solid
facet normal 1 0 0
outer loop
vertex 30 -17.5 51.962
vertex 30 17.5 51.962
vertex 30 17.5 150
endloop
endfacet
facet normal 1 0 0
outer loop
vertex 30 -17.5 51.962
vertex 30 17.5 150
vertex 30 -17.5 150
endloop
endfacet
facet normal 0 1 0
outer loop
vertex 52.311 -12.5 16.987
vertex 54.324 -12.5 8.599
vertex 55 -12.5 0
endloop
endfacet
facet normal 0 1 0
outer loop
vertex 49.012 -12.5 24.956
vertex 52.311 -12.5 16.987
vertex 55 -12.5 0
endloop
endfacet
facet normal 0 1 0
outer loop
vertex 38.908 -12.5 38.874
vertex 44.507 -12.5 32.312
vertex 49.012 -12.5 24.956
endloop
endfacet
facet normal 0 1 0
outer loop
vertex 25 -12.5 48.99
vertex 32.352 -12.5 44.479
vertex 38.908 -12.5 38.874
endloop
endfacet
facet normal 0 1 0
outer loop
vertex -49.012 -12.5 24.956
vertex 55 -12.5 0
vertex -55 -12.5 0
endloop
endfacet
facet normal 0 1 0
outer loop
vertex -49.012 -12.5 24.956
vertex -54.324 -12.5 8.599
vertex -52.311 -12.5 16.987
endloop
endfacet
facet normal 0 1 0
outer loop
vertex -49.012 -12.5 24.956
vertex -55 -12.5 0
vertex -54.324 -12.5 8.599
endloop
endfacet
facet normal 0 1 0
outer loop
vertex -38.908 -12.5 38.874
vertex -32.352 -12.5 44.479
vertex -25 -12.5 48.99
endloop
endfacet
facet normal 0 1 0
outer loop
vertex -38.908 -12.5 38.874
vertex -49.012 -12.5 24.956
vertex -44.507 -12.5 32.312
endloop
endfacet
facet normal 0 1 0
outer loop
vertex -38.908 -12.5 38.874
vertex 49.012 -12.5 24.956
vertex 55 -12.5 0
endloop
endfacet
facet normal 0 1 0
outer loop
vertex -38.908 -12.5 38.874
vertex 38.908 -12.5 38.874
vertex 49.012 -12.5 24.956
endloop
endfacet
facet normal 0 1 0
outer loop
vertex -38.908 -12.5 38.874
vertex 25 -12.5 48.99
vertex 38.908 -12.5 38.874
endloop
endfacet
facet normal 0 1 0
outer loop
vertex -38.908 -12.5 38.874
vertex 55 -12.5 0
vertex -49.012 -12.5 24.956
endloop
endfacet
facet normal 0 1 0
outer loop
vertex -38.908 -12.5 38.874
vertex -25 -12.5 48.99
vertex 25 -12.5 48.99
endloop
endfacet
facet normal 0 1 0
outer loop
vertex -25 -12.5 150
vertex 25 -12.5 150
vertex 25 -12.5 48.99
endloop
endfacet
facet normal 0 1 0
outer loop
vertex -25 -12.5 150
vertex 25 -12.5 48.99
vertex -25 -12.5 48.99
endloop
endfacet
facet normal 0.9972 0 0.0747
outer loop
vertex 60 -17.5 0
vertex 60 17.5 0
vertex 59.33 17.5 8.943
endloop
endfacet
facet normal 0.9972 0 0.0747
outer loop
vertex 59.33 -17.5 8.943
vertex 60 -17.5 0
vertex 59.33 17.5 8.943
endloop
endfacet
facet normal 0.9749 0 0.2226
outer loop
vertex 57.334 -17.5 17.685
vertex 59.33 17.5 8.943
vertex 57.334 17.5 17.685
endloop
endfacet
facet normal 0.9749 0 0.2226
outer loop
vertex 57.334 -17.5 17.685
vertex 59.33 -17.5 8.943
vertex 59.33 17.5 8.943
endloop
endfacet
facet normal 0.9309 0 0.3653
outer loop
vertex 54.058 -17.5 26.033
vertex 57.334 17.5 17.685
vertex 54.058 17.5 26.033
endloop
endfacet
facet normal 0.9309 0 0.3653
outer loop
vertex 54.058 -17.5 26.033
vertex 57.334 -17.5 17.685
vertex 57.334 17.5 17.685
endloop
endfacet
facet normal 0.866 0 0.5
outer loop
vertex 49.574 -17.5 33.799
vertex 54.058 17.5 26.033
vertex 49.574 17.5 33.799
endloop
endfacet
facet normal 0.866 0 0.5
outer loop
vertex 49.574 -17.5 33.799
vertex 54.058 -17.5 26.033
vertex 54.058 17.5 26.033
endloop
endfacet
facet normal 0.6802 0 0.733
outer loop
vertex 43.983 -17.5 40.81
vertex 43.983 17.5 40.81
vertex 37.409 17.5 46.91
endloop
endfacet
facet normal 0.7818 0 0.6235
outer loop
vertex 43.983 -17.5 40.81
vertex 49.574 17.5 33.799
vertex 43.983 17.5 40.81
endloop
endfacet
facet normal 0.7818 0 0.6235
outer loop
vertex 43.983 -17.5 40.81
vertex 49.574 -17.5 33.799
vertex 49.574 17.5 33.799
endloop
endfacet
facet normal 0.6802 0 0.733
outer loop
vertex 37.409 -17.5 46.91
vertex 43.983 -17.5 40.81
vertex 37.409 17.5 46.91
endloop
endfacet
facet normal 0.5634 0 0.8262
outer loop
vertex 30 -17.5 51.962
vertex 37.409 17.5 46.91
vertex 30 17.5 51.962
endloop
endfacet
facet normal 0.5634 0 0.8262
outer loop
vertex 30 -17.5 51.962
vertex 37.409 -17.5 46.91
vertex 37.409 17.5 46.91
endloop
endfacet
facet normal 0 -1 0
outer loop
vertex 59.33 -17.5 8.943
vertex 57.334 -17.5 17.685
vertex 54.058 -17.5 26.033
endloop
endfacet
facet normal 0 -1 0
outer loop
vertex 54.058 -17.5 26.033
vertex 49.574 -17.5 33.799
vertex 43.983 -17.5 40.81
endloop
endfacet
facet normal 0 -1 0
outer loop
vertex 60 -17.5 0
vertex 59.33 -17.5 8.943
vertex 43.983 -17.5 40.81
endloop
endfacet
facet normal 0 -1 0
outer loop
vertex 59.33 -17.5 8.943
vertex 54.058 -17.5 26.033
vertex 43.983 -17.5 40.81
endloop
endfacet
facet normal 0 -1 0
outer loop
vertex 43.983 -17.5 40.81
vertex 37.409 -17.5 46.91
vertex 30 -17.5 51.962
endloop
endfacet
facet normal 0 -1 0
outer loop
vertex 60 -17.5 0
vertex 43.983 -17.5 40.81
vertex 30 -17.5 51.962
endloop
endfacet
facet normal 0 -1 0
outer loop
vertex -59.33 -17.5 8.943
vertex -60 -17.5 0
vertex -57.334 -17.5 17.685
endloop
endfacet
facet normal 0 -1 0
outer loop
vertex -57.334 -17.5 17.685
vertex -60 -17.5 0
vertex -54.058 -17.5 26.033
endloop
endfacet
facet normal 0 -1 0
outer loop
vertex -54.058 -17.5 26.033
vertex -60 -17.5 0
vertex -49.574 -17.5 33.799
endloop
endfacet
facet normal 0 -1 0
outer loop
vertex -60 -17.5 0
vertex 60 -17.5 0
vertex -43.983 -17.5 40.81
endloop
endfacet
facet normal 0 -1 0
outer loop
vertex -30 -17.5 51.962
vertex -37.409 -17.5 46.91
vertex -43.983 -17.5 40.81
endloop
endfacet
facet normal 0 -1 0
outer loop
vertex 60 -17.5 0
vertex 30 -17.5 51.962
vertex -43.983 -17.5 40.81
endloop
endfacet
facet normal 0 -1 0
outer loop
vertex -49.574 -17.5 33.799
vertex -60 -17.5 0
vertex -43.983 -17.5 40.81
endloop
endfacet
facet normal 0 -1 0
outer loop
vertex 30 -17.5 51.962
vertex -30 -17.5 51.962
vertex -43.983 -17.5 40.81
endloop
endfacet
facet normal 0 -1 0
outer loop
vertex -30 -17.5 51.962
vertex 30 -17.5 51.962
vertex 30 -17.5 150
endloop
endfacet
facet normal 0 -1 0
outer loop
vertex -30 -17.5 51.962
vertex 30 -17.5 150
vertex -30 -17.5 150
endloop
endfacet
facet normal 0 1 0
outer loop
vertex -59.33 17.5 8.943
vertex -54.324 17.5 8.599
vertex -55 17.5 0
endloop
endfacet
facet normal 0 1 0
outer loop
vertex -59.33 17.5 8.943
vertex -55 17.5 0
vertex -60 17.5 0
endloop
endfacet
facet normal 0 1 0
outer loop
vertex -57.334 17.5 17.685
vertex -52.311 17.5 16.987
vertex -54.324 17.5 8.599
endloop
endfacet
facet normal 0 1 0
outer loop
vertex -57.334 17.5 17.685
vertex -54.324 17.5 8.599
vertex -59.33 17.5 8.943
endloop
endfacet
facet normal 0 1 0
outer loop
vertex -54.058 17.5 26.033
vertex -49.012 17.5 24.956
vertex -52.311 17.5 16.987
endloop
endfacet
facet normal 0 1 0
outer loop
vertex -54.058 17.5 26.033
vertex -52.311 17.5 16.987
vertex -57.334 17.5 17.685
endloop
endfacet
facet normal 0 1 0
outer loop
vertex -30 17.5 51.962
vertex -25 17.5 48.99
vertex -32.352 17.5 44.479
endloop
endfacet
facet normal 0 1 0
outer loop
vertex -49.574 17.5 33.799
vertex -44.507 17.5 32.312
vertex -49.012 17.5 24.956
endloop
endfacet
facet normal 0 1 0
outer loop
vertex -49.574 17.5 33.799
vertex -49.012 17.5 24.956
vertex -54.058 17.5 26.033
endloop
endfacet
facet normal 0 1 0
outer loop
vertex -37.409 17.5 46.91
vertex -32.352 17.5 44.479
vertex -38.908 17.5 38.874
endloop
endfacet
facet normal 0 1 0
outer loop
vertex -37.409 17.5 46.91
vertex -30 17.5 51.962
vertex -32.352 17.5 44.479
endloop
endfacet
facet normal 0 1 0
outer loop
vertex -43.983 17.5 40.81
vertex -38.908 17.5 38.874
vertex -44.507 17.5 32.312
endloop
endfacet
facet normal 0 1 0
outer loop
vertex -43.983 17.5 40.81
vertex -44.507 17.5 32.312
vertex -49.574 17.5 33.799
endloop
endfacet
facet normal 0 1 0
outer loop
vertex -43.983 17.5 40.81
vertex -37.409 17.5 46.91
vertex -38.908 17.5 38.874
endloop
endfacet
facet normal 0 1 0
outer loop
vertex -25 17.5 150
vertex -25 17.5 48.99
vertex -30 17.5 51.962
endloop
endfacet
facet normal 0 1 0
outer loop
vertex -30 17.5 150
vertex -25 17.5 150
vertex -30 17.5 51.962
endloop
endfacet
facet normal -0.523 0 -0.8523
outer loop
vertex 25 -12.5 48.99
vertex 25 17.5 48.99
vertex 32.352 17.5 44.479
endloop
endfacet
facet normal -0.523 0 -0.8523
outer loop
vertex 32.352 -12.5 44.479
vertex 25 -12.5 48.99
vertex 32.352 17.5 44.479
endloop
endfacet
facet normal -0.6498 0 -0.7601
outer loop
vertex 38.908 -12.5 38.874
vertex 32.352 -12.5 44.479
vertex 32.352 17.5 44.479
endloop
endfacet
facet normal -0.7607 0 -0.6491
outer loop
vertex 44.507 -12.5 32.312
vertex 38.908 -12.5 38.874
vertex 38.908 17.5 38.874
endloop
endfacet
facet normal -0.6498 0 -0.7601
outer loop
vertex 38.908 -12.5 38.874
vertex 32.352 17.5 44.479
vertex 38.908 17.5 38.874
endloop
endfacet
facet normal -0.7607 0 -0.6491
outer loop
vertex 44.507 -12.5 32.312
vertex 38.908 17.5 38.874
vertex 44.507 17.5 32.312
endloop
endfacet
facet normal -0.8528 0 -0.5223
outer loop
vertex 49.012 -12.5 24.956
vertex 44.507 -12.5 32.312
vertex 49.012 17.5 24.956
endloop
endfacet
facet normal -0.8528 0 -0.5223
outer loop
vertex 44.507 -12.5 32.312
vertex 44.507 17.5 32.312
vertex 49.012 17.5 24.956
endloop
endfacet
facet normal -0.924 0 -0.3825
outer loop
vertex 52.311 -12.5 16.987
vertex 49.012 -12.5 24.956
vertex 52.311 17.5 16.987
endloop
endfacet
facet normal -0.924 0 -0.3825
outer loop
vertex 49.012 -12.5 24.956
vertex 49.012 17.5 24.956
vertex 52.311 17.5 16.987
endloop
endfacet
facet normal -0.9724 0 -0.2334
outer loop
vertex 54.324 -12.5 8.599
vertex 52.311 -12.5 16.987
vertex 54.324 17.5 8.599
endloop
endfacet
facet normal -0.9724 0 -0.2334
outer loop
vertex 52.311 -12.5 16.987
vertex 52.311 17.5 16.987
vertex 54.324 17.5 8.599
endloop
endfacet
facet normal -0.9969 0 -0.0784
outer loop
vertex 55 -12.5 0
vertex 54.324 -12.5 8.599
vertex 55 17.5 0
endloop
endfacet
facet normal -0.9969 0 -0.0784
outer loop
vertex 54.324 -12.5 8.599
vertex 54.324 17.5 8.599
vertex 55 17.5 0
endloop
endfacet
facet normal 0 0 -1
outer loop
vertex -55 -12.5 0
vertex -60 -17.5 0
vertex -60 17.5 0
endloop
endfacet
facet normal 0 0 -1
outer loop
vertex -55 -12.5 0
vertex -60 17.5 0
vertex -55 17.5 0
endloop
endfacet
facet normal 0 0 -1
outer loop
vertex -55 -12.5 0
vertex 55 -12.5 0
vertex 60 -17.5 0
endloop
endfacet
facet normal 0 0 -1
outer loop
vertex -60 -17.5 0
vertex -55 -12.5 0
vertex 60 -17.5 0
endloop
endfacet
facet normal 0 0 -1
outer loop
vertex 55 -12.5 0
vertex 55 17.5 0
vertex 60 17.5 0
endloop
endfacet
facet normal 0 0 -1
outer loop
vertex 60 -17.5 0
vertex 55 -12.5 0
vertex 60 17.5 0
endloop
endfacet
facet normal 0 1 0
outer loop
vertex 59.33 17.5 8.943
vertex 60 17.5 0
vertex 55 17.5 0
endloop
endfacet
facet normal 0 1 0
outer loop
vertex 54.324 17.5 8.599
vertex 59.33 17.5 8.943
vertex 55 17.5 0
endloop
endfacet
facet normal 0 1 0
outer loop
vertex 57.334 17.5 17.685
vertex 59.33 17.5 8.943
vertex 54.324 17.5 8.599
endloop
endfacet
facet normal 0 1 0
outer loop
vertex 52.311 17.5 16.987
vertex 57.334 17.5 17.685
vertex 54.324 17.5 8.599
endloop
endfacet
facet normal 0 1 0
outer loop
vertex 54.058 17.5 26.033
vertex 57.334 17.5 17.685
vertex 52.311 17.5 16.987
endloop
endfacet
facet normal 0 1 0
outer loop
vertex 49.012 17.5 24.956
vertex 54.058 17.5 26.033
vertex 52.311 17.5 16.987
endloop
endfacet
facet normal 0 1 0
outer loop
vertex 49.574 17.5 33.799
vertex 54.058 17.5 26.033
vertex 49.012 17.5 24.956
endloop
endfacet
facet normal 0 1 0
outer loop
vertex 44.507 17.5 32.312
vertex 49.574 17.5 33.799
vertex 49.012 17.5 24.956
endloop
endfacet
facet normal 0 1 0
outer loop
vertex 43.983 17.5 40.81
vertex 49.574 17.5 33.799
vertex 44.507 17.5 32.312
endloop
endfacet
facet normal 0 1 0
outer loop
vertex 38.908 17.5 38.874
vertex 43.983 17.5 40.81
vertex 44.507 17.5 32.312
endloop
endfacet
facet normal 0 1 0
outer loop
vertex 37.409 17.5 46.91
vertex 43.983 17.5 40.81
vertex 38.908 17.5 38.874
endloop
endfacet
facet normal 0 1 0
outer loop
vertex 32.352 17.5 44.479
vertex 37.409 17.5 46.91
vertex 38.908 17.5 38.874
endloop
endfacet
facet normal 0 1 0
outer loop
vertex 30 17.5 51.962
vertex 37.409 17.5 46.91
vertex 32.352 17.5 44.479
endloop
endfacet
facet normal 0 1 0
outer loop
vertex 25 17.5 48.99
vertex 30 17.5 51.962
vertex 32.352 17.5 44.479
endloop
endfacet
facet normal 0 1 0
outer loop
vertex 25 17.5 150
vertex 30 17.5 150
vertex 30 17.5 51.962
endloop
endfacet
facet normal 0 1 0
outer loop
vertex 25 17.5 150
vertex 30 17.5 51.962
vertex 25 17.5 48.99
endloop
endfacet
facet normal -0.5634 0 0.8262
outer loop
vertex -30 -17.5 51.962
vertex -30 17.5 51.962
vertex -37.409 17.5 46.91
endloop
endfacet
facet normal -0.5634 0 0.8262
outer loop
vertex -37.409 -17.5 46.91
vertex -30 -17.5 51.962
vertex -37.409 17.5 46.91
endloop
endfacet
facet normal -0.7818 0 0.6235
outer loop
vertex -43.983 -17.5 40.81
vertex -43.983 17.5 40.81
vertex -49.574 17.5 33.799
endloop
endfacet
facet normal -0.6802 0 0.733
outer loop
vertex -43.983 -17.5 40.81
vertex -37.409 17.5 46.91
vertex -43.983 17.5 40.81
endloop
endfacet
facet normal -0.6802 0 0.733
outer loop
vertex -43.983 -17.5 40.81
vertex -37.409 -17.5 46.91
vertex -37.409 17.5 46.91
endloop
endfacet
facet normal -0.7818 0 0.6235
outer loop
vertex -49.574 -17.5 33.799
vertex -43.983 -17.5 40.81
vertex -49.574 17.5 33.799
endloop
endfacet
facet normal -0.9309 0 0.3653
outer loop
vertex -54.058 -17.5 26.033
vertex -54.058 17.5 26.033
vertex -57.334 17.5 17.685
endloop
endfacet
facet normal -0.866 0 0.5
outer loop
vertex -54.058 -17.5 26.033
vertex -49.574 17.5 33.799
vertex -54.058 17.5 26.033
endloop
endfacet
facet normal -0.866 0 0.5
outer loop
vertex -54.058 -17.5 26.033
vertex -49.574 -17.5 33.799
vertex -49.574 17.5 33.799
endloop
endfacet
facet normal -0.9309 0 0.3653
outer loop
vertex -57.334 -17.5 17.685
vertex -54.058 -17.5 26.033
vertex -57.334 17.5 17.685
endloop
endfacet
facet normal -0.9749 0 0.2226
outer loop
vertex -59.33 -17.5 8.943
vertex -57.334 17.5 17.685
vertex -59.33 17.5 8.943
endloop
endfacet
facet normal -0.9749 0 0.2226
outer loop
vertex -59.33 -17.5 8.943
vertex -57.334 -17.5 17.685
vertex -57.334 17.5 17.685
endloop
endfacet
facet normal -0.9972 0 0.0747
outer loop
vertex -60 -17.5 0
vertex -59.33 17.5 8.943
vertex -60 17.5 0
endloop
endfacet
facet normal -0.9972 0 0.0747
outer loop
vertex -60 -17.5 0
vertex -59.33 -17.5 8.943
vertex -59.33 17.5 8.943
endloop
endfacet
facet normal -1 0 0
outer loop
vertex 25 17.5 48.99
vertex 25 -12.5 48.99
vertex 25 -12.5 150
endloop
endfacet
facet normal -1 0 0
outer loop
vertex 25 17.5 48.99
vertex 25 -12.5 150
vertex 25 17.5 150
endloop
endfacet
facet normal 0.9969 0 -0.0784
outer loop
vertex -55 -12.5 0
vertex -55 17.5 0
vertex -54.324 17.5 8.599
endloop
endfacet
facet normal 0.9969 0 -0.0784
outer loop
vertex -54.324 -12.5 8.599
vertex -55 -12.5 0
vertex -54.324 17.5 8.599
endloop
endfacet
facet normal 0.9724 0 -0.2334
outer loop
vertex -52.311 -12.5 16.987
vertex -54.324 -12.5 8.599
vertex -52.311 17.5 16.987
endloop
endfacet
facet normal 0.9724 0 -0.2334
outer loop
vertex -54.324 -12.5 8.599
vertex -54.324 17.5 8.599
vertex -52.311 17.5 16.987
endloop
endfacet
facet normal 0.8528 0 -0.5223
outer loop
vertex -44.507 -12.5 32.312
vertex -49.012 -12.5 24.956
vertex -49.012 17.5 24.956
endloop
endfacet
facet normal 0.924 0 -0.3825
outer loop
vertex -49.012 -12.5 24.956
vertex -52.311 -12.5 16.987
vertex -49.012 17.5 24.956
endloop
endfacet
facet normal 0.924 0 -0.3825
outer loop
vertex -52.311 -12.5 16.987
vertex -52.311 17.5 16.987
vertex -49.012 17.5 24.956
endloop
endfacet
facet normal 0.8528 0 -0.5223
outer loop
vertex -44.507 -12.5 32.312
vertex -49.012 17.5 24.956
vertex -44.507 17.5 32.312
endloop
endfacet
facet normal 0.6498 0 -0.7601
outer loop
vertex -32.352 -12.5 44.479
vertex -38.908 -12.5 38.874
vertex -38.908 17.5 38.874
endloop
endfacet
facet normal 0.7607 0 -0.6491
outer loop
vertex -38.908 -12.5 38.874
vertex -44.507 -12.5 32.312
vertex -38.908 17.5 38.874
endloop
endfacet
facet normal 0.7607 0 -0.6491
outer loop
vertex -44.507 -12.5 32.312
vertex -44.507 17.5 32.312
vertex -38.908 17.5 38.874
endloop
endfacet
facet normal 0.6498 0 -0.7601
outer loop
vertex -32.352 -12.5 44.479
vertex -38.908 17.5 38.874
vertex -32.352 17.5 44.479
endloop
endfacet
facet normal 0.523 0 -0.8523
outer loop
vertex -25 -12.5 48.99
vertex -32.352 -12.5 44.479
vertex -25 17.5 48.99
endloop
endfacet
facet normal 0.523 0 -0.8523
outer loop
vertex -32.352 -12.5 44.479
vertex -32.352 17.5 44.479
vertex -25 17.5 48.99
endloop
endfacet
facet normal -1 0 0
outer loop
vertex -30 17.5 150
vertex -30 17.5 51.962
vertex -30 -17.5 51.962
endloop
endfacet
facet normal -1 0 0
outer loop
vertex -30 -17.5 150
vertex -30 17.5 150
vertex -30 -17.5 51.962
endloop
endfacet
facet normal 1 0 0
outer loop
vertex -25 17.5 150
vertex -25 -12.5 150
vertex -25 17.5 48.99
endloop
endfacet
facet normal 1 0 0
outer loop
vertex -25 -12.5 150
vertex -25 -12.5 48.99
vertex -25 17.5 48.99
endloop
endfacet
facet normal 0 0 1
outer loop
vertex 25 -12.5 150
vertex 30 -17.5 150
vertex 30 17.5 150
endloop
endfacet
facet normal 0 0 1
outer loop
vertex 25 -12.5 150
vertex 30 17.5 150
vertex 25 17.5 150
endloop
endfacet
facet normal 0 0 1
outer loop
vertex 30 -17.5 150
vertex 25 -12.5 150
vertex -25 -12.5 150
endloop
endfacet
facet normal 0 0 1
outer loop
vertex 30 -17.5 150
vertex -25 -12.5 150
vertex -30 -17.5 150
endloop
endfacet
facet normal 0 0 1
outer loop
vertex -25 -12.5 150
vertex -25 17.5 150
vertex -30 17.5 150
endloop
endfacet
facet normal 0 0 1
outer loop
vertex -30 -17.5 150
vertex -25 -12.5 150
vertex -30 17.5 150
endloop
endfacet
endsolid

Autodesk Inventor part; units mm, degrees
ref_plane "YZ Plane" through (0, 0, 0) normal (1, 0, 0) x (0, 1, 0)
ref_plane "XZ Plane" through (0, 0, 0) normal (0, 1, 0) x (-1, 0, 0)
ref_plane "XY Plane" through (0, 0, 0) normal (0, 0, 1) x (1, 0, 0)
sketch "Sketch1" plane through (0, 0, 0) normal (0, 0, 1) x (1, 0, 0)
  line L0 (-60, -17.5) -> (0, -17.5)
  line L1 (60, -17.5) -> (60, 17.5) construction
  line L2 (60, 17.5) -> (55, 17.5) construction
  line L3 (-60, 17.5) -> (-60, -17.5)
  line L4 (-60, -17.5) -> (60, 17.5) construction
  line L5 (60, -17.5) -> (-60, 17.5) construction
  line L6 (-55, -12.5) -> (0, -12.5)
  line L7 (55, -12.5) -> (55, 12.5) construction
  line L8 (55, 12.5) -> (-55, 12.5) construction
  line L9 (-55, 12.5) -> (-55, -12.5)
  line L10 (-55, 12.5) -> (-55, 17.5)
  line L11 (55, 12.5) -> (55, 17.5) construction
  line L12 (-55, 17.5) -> (-60, 17.5)
  line L13 (55, 17.5) -> (-55, 17.5) construction
  line L14 (0, -17.5) -> (0, 17.5)
  line L15 (0, -12.5) -> (55, -12.5) construction
  line L16 (0, -17.5) -> (60, -17.5) construction
  line L17 (0, -12.5) -> (0, -17.5)
  line L18 (0, 17.5) -> (-55, 17.5)
  point P0 (0, 0)
  dimension "d0" = 120
  dimension "d1" = 35
  dimension "d2" = 5
  dimension "d3" = 5
  dimension "d4" = 5
  dimension "d5" = 30
revolve "Revolution1" add sketch "Sketch1" angle 180 about axis through (0, -17.5, 0) along (0, 1, 0) contours L3 L12 L10 L9 L6 L14 L0
sketch "Sketch2" plane through (60, -17.5, 0) normal (0, 0, -1) x (-1, 0, 0)
  line L0 (0, 35) -> (0, 0) projected
  line L1 (0, 0) -> (60, 0) construction
  line L2 (120, 0) -> (0, 0) projected
  line L3 (60, 0) -> (60, 35) construction
  line L4 (60, 0) -> (60, 5) construction
  line L5 (60, 5) -> (35, 5)
  line L6 (35, 5) -> (35, 35)
  line L7 (35, 35) -> (30, 35)
  line L8 (30, 35) -> (30, 0)
  line L9 (60, 5) -> (85, 5)
  line L10 (85, 5) -> (85, 35)
  line L11 (85, 35) -> (90, 35)
  line L12 (90, 35) -> (90, 0)
  point P0 (60, 17.5)
  dimension "d7" = 60
  dimension "d8" = 35
  dimension "d9" = 5
  dimension "d10" = 25
  dimension "d11" = 30
  dimension "d12" = 5
extrude "Extrusion1" add sketch "Sketch2" against normal blind 150
sketch "Sketch3" plane through (60, -17.5, 0) normal (0, 0, -1) x (-1, 0, 0)
  line L0 (35, 35) -> (35, 5) projected
  line L1 (85, 5) -> (35, 5) projected
  line L2 (85, 5) -> (85, 35) projected
  line L3 (85, 35) -> (35, 35) projected
  point P0 (60, 17.5)
extrude "Extrusion2" cut sketch "Sketch3" against normal through all
revolve "Revolution2" cut sketch "Sketch1" angle 360 about axis through (0, -17.5, 0) along (0, 1, 0) contours L6 L9 L10 L18 L14
properties part number "select end track"
